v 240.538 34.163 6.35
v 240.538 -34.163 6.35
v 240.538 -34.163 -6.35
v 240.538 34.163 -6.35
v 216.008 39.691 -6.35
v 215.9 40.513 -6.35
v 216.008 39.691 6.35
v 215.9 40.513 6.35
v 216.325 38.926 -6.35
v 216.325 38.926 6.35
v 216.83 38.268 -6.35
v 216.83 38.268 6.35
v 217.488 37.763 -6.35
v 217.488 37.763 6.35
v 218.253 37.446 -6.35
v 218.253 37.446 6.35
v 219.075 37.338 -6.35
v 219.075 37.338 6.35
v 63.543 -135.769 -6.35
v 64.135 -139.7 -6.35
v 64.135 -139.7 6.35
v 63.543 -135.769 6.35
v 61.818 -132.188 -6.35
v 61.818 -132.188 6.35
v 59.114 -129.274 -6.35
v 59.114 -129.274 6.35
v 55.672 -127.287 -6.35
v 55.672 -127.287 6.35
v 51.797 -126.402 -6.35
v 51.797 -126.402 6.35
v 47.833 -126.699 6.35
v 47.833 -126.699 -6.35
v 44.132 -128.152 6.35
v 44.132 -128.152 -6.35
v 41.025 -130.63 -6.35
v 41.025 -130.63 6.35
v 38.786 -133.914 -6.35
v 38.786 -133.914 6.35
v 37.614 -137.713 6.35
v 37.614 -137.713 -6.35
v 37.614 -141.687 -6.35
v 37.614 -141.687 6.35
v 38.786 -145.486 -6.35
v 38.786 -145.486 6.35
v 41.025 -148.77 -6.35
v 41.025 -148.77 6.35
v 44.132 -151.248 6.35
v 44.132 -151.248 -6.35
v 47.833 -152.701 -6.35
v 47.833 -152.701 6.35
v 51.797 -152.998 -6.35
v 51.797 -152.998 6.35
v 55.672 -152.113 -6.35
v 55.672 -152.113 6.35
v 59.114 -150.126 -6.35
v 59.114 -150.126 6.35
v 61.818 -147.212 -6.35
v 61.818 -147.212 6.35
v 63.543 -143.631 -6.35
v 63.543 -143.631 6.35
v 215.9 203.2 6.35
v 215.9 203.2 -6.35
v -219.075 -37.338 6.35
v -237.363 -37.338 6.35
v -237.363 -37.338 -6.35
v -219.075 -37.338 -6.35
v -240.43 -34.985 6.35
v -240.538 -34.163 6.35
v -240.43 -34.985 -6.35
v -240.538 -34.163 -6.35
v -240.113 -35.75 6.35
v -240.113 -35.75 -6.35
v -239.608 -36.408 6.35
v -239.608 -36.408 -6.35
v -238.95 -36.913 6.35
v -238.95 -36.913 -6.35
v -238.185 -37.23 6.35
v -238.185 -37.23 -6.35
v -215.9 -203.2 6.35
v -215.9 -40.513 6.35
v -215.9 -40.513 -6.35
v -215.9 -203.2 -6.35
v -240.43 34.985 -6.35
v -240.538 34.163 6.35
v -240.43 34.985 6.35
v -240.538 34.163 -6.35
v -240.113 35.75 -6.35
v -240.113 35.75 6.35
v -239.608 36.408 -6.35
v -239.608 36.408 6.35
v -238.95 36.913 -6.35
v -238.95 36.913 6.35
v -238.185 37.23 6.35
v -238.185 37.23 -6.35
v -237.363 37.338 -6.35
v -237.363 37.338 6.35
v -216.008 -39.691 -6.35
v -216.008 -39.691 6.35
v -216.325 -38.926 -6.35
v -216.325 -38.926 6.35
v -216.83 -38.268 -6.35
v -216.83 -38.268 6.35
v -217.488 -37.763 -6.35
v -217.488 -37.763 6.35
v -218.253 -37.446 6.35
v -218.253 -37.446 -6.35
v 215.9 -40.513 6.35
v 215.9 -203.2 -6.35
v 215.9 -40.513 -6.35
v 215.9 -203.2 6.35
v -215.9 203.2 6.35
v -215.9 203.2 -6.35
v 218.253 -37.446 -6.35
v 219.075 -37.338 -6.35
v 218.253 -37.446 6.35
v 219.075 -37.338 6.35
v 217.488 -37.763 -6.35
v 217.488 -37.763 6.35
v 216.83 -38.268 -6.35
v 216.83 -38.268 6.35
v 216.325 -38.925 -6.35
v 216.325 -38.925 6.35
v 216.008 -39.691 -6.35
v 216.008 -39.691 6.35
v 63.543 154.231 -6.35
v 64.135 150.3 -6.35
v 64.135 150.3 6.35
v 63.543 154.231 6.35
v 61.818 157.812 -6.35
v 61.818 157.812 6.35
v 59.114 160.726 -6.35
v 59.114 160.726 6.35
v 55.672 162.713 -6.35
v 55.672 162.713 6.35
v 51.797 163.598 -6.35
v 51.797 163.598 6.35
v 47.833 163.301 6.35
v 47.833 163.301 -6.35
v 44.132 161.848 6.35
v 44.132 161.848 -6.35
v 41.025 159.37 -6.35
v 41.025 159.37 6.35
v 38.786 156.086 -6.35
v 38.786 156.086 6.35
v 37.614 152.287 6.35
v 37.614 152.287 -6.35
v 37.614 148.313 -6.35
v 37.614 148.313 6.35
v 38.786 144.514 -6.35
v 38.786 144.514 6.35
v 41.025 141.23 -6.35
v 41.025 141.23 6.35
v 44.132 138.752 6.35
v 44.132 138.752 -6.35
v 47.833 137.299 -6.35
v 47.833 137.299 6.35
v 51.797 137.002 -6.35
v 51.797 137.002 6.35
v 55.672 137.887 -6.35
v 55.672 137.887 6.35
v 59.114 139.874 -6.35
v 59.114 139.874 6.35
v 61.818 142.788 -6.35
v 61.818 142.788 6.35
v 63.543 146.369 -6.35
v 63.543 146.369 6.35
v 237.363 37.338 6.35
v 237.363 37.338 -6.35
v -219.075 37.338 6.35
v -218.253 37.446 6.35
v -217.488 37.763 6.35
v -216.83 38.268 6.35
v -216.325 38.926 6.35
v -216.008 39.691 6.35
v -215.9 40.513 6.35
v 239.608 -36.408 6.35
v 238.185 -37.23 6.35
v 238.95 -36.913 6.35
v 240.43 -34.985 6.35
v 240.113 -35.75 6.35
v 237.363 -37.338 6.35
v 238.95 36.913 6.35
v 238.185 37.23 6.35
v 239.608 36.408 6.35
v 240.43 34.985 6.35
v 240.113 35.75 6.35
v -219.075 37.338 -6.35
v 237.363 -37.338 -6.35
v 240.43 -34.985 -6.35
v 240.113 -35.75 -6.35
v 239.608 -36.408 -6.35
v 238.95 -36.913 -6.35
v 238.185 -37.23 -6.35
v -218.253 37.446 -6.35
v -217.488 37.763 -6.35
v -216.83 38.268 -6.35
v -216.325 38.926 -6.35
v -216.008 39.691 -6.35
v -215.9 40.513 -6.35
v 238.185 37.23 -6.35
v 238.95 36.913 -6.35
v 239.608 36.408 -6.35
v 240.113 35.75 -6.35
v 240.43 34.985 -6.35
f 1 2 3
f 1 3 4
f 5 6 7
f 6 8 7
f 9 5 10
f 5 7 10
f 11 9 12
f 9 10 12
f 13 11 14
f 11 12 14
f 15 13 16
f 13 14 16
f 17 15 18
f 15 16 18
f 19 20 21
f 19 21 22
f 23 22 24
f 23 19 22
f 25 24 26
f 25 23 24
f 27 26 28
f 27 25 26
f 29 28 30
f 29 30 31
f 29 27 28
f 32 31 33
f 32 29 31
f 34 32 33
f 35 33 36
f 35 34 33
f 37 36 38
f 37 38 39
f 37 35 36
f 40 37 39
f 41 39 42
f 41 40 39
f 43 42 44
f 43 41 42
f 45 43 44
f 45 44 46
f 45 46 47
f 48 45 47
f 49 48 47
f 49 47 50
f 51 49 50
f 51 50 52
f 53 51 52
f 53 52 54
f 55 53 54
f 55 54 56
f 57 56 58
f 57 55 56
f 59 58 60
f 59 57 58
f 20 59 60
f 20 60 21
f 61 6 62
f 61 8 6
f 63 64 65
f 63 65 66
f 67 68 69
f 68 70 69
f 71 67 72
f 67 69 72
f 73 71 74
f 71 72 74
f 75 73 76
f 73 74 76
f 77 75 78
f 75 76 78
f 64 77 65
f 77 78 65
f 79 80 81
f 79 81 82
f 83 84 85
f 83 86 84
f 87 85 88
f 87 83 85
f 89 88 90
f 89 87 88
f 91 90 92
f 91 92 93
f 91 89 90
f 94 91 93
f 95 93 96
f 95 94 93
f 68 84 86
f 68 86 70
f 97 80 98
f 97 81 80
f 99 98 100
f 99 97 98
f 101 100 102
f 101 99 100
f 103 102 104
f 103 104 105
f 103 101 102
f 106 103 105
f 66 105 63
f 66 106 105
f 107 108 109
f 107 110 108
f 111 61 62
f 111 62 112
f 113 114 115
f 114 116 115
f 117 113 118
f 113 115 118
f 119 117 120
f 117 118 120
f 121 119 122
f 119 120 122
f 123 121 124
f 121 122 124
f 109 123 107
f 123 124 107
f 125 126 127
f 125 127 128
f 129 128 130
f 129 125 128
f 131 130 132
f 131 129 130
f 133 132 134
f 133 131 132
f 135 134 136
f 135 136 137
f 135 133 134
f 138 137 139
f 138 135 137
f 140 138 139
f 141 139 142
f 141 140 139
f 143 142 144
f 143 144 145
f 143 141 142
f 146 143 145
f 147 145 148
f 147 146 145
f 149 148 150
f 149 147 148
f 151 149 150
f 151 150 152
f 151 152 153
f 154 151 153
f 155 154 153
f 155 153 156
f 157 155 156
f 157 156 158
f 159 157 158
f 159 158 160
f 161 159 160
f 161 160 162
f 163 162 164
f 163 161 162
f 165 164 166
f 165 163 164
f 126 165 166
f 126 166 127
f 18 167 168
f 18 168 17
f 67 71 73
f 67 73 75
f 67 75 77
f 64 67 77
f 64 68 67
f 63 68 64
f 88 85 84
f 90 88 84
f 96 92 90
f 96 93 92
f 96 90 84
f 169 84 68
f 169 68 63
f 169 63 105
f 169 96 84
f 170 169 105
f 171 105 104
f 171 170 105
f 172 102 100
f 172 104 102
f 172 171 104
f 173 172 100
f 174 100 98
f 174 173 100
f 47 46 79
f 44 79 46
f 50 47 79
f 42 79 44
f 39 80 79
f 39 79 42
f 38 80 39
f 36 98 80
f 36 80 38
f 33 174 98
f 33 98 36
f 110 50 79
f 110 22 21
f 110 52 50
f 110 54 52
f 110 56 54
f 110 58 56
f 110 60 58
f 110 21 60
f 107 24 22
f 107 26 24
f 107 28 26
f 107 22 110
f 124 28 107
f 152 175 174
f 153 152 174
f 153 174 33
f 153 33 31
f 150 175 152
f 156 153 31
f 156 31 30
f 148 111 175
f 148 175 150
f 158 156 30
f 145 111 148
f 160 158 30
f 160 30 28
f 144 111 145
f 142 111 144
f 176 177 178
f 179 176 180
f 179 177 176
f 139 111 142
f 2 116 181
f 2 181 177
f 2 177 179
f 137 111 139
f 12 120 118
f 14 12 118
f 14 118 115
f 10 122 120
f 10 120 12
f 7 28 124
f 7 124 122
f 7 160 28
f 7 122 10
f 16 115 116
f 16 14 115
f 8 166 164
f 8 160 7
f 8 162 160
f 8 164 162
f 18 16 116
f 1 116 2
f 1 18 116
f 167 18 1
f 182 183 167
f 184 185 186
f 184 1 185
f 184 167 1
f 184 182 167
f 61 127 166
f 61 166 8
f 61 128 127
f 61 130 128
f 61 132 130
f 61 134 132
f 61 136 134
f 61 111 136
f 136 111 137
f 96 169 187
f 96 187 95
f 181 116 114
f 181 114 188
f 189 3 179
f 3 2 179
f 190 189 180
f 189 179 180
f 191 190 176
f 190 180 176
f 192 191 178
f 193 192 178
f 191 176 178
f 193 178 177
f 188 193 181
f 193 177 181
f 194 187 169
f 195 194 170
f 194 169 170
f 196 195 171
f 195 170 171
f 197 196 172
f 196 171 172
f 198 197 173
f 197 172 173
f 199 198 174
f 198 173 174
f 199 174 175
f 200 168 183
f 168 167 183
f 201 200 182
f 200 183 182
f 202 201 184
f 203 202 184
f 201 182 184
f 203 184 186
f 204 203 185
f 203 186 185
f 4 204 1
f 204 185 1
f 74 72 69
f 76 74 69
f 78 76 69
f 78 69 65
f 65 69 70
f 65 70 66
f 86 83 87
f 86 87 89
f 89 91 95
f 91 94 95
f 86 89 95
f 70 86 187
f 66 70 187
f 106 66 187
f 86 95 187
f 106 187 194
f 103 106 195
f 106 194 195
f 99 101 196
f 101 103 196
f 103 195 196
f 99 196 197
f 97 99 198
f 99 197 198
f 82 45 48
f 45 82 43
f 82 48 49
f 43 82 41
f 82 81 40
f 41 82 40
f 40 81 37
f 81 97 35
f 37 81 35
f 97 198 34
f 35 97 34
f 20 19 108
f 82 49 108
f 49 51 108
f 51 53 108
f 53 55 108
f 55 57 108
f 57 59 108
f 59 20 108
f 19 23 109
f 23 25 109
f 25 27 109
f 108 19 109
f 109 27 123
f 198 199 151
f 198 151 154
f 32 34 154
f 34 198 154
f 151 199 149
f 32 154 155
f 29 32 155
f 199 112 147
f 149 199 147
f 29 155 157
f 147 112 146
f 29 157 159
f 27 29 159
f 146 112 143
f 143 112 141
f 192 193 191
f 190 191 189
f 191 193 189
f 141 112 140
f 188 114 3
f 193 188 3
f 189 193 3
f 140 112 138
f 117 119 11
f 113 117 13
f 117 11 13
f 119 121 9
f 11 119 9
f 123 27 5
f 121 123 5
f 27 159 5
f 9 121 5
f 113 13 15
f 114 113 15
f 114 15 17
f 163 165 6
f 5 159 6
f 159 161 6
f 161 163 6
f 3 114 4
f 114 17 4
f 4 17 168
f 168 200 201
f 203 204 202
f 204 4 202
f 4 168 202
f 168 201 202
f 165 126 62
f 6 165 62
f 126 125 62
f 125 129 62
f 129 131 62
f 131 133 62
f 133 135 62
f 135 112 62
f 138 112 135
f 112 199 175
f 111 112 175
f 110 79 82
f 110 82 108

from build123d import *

# Parameters (mm, degrees)
BOSS_EXTRUDE1_DEPTH = 6.35
CAVITY1_START       = -6.35
CAVITY1_OUTLINE_R   = 12.7
CAVITY1_DEPTH       = 12.7
MOVE_FACE_SLOT_BY   = 0.762
MOVE_FACE_SLOT_2_BY = 0.762
MOVE_FACE_SLOT_3_BY = 0.762
MOVE_FACE_SLOT_4_BY = 0.762
MOVE_FACE_SLOT_5_BY = 0.762
MOVE_FACE_SLOT_6_BY = 0.762
FILLET1_R           = 3.175
MOVE_FACE_HOLE_BY   = 0.635
MOVE_FACE_HOLE_2_BY = 0.635


# Read off the part's stored shape, not the designer's step: Cavity1
with BuildPart() as part:
    # Sketch1 → Boss-Extrude1 (new, symmetric)
    with BuildSketch(Plane.XY):
        Polygon((-215.9, -38.1), (-215.9, -203.2), (215.9, -203.2), (215.9, -38.1), (241.3, -38.1), (241.3, 38.1), (215.9, 38.1), (215.9, 203.2), (-215.9, 203.2), (-215.9, 38.1), (-241.3, 38.1), (-241.3, -38.1), align=None)
    extrude(amount=BOSS_EXTRUDE1_DEPTH, both=True)

    # Cavity1 outline → Cavity1 (cut)
    with BuildSketch(Plane.XY.offset(CAVITY1_START)):
        with Locations((50.8, -139.7)):
            Circle(CAVITY1_OUTLINE_R)
        with Locations((50.8, 150.3)):
            Circle(CAVITY1_OUTLINE_R)
    extrude(amount=CAVITY1_DEPTH, mode=Mode.SUBTRACT)

    # Move Face slot: a face moved inward by 0.762
    extrude(part.faces().sort_by_distance((241.3, 0, 0))[0], amount=MOVE_FACE_SLOT_BY, dir=(-1, 0, 0), mode=Mode.SUBTRACT)

    # Move Face slot 2: a face moved inward by 0.762
    extrude(part.faces().sort_by_distance((228.6, 38.1, 0))[0], amount=MOVE_FACE_SLOT_2_BY, dir=(0, -1, 0), mode=Mode.SUBTRACT)

    # Move Face slot 3: a face moved inward by 0.762
    extrude(part.faces().sort_by_distance((-228.6, 38.1, 0))[0], amount=MOVE_FACE_SLOT_3_BY, dir=(0, -1, 0), mode=Mode.SUBTRACT)

    # Move Face slot 4: a face moved inward by 0.762
    extrude(part.faces().sort_by_distance((-241.3, 0, 0))[0], amount=MOVE_FACE_SLOT_4_BY, dir=(1, 0, 0), mode=Mode.SUBTRACT)

    # Move Face slot 5: a face moved inward by 0.762
    extrude(part.faces().sort_by_distance((-228.6, -38.1, 0))[0], amount=MOVE_FACE_SLOT_5_BY, dir=(0, 1, 0), mode=Mode.SUBTRACT)

    # Move Face slot 6: a face moved inward by 0.762
    extrude(part.faces().sort_by_distance((228.6, -38.1, 0))[0], amount=MOVE_FACE_SLOT_6_BY, dir=(0, 1, 0), mode=Mode.SUBTRACT)

    # Fillet1
    fillet1_edges = [part.edges().sort_by_distance(p)[0] for p in [
        (215.9, -37.338, 0),
        (240.538, -37.338, 0),
        (240.538, 37.338, 0),
        (215.9, 37.338, 0),
        (-215.9, 37.338, 0),
        (-240.538, 37.338, 0),
        (-240.538, -37.338, 0),
        (-215.9, -37.338, 0),
    ]]
    fillet(fillet1_edges, radius=FILLET1_R)

    # Move Face hole: a curved face moved inward by 0.635
    add(Solid.thicken(part.faces().sort_by_distance((38.1, -139.7, 0))[0], -MOVE_FACE_HOLE_BY), mode=Mode.SUBTRACT)

    # Move Face hole 2: a curved face moved inward by 0.635
    add(Solid.thicken(part.faces().sort_by_distance((38.1, 150.3, 0))[0], -MOVE_FACE_HOLE_2_BY), mode=Mode.SUBTRACT)


solid = part.part
